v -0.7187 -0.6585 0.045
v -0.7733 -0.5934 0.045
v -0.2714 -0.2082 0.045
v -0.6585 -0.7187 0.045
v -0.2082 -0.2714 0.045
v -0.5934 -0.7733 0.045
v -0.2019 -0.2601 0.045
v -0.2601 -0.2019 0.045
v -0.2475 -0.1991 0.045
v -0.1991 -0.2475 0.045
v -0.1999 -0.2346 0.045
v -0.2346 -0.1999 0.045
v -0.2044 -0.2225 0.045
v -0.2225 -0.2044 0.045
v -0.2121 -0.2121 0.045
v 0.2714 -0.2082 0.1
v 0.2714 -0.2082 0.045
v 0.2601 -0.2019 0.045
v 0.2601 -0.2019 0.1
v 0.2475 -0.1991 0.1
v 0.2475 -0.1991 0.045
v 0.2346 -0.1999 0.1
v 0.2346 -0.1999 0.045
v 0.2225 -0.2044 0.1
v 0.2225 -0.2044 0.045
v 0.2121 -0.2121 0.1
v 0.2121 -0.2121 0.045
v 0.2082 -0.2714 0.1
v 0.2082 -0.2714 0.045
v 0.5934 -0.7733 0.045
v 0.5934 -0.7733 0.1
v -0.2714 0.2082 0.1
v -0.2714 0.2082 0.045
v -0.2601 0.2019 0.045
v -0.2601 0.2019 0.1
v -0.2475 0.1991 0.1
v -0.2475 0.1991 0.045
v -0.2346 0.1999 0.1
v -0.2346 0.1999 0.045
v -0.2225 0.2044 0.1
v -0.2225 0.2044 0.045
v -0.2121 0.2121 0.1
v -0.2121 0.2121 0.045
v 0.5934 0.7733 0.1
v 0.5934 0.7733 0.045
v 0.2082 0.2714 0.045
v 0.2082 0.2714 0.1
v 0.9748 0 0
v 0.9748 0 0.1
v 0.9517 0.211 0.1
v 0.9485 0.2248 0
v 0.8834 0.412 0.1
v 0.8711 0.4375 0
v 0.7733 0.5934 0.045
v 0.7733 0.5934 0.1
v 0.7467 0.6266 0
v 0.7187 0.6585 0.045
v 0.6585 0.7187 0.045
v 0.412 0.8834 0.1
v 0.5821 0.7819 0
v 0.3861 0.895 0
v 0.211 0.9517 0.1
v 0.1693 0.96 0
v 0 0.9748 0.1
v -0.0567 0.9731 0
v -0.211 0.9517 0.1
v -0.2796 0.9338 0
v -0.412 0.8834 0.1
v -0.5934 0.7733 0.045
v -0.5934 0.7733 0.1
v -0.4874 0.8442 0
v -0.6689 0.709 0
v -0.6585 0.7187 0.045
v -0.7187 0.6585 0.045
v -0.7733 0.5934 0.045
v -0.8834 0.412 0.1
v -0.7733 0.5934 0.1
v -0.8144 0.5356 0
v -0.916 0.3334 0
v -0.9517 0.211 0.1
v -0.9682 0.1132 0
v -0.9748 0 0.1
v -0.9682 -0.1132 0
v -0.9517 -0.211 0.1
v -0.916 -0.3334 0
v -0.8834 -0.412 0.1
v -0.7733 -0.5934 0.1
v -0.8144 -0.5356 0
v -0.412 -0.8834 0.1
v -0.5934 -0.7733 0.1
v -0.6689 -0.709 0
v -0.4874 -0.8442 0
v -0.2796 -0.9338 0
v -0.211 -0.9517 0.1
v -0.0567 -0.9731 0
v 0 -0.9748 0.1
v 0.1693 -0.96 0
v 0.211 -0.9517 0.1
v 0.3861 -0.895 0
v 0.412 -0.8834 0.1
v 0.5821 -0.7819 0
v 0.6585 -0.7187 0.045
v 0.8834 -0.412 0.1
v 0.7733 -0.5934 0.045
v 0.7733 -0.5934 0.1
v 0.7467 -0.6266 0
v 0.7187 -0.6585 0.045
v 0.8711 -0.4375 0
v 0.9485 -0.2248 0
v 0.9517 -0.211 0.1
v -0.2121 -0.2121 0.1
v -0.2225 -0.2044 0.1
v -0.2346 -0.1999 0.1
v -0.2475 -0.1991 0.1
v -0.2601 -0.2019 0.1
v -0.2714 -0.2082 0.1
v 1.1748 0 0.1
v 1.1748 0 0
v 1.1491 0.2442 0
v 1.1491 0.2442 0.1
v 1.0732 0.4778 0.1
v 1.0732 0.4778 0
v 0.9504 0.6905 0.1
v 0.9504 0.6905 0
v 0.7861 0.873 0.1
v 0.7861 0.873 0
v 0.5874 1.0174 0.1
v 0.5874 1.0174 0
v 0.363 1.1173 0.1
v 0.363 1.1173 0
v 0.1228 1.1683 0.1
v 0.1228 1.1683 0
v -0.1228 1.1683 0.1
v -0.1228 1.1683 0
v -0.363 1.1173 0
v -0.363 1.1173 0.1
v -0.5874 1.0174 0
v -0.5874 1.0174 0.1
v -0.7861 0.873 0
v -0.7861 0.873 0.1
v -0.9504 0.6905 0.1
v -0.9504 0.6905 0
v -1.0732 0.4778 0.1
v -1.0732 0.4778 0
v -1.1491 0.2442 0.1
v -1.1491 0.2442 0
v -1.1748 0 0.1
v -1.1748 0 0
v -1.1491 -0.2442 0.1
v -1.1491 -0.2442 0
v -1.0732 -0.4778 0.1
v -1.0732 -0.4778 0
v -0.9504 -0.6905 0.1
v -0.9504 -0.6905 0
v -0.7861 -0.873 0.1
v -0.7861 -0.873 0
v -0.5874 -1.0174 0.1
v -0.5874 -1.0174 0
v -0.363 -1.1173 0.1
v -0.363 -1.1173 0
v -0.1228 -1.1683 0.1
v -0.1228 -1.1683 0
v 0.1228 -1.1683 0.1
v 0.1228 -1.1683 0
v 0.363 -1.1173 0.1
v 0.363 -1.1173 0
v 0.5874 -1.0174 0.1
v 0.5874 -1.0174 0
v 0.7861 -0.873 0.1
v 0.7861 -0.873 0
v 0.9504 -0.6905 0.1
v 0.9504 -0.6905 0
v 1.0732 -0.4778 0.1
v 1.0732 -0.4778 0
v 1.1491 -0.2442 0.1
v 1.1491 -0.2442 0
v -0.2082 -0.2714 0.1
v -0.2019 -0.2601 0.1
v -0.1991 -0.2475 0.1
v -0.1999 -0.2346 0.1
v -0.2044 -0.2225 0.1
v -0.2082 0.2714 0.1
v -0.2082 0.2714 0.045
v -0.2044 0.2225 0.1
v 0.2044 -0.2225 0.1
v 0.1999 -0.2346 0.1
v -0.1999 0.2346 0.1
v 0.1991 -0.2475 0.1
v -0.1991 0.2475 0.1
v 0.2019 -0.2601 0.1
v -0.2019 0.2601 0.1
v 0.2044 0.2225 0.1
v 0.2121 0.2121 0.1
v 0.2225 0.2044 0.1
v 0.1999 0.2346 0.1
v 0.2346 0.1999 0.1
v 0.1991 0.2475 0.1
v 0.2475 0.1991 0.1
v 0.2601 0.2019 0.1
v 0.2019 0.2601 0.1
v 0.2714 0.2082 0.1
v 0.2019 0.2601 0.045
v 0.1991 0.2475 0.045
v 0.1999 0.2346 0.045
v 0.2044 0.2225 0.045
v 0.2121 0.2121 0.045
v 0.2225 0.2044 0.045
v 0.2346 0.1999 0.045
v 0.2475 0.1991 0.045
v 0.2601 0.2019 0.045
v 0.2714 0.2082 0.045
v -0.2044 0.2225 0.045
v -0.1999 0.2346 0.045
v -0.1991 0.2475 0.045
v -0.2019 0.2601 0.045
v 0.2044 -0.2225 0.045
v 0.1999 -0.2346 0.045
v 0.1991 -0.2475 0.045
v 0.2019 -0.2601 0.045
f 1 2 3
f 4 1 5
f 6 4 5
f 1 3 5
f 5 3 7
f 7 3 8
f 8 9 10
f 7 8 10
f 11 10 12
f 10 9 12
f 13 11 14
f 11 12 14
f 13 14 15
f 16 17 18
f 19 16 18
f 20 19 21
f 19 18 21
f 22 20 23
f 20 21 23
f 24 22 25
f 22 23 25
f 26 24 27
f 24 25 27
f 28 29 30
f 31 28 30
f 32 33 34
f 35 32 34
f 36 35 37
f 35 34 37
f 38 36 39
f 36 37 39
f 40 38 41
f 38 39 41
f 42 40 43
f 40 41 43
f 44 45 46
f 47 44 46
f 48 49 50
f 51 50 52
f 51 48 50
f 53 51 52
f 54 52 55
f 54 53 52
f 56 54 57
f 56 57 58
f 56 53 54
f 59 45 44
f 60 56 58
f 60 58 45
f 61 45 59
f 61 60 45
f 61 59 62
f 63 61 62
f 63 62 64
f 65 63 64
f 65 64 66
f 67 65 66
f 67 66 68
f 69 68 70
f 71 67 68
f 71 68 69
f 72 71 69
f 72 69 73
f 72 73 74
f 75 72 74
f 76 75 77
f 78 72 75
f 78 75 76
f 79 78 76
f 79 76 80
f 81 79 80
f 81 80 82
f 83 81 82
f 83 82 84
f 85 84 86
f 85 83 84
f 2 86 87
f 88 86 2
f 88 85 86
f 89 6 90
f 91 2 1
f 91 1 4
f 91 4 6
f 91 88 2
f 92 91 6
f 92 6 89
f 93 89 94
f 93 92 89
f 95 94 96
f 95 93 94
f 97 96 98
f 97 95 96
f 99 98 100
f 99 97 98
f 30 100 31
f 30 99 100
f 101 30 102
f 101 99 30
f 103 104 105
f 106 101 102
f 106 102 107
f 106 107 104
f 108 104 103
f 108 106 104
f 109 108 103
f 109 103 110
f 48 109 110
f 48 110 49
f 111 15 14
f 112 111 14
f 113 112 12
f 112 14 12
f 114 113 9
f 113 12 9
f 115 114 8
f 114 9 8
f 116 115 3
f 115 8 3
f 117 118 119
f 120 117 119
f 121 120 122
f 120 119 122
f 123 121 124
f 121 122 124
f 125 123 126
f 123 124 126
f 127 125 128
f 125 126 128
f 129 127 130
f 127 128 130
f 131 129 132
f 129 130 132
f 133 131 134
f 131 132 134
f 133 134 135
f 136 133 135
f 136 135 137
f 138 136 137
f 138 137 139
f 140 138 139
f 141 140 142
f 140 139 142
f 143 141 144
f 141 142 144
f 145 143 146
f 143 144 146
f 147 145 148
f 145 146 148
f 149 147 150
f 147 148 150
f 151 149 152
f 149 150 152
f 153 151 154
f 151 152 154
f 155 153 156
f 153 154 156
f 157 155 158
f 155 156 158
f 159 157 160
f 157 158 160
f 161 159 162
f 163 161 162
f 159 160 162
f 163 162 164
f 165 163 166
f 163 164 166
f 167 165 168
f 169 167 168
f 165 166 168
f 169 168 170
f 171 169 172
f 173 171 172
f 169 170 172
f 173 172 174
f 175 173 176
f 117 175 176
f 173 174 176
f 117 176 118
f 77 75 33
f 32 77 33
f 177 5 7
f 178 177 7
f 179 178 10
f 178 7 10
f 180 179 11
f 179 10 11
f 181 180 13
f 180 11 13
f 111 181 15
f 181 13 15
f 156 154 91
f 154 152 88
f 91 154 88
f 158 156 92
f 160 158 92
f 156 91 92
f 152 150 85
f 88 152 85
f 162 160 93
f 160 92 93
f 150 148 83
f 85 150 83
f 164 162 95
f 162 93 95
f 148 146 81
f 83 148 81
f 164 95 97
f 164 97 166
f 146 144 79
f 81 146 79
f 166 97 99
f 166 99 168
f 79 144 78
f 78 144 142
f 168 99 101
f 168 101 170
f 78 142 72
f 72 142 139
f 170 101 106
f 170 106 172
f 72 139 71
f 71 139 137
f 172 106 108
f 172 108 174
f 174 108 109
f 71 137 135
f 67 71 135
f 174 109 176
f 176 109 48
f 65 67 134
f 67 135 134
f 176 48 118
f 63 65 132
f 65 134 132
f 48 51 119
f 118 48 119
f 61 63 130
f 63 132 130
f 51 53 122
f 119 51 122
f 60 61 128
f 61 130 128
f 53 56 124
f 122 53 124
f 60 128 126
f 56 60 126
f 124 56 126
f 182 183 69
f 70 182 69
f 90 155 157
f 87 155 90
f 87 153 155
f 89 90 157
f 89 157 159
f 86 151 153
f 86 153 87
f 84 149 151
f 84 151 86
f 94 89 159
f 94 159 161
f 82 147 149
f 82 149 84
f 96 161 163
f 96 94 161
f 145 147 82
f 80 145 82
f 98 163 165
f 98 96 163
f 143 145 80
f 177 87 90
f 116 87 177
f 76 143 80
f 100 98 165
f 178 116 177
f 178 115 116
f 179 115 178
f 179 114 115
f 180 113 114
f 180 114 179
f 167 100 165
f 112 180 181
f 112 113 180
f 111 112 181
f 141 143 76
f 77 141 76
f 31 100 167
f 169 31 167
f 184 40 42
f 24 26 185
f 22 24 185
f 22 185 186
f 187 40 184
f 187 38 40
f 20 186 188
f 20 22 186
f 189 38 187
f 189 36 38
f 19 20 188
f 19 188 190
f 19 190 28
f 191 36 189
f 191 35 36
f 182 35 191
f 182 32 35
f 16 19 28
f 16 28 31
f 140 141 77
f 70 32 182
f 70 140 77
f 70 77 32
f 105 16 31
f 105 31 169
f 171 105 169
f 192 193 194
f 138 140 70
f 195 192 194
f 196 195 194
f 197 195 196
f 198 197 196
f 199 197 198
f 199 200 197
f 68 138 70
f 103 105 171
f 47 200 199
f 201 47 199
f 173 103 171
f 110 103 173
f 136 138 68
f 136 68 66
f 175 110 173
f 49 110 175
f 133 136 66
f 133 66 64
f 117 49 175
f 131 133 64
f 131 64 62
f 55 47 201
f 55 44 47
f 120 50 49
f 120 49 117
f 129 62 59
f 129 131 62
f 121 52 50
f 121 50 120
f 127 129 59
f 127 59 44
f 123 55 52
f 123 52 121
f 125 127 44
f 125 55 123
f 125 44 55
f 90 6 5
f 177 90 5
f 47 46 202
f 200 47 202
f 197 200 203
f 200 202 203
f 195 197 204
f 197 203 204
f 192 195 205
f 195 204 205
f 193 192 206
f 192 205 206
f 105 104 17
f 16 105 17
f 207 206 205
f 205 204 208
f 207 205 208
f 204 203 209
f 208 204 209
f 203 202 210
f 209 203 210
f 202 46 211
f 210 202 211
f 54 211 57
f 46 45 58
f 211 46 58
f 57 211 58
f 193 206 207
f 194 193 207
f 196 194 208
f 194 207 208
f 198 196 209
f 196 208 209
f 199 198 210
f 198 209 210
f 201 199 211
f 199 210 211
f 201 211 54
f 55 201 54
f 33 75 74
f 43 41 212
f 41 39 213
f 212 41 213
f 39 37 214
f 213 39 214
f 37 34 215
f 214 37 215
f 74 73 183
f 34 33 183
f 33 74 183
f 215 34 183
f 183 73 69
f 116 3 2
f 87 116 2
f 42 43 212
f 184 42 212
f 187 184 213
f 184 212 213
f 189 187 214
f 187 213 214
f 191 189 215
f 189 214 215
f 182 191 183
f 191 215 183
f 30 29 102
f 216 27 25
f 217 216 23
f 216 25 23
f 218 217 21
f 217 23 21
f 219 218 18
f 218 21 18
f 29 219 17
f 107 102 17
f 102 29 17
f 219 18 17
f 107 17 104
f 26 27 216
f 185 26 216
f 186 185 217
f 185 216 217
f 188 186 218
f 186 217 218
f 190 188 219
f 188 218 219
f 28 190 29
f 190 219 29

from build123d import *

# Parameters (mm, degrees)
SKETCH_1_R      = 1.174760425
SKETCH_1_R_2    = 0.974760425
EXTRUDE_1_DEPTH = 0.1
EXTRUDE_START   = -0.055
EXTRUDE_2_DEPTH = 0.055


with BuildPart() as part:
    # 草圖1 → 填料-伸長1 (new body)
    with BuildSketch(Plane.XY):
        Circle(SKETCH_1_R)
        Circle(SKETCH_1_R_2, mode=Mode.SUBTRACT)
    extrude(amount=EXTRUDE_1_DEPTH)

    # 草圖2 → 填料-伸長2 (add)
    with BuildSketch(Plane.XY.offset(0.1).offset(EXTRUDE_START)):
        with BuildLine():
            Line((-0.208247811, 0.271393831), (-0.59339655, 0.77332944))
            ThreePointArc((-0.59339655, 0.77332944), (-0.689259707, 0.689259707), (-0.77332944, 0.59339655))
            Line((-0.77332944, 0.59339655), (-0.271393831, 0.208247811))
            ThreePointArc((-0.271393831, 0.208247811), (-0.241031974, 0.199037642), (-0.212132034, 0.212132034))
            ThreePointArc((-0.212132034, 0.212132034), (-0.199037642, 0.241031974), (-0.208247811, 0.271393831))
        make_face()
        with BuildLine():
            ThreePointArc((0.208247811, 0.271393831), (0.199037642, 0.241031974), (0.212132034, 0.212132034))
            ThreePointArc((0.212132034, 0.212132034), (0.241031974, 0.199037642), (0.271393831, 0.208247811))
            Line((0.271393831, 0.208247811), (0.77332944, 0.59339655))
            ThreePointArc((0.77332944, 0.59339655), (0.689259707, 0.689259707), (0.59339655, 0.77332944))
            Line((0.59339655, 0.77332944), (0.208247811, 0.271393831))
        make_face()
        with BuildLine():
            ThreePointArc((0.271393831, -0.208247811), (0.241031974, -0.199037642), (0.212132034, -0.212132034))
            ThreePointArc((0.212132034, -0.212132034), (0.199037642, -0.241031974), (0.208247811, -0.271393831))
            Line((0.208247811, -0.271393831), (0.59339655, -0.77332944))
            ThreePointArc((0.59339655, -0.77332944), (0.689259707, -0.689259707), (0.77332944, -0.59339655))
            Line((0.77332944, -0.59339655), (0.271393831, -0.208247811))
        make_face()
        with BuildLine():
            ThreePointArc((-0.208247811, -0.271393831), (-0.199037642, -0.241031974), (-0.212132034, -0.212132034))
            ThreePointArc((-0.212132034, -0.212132034), (-0.241031974, -0.199037642), (-0.271393831, -0.208247811))
            Line((-0.271393831, -0.208247811), (-0.77332944, -0.59339655))
            ThreePointArc((-0.77332944, -0.59339655), (-0.689259707, -0.689259707), (-0.59339655, -0.77332944))
            Line((-0.59339655, -0.77332944), (-0.208247811, -0.271393831))
        make_face()
    extrude(amount=EXTRUDE_2_DEPTH)


solid = part.part
